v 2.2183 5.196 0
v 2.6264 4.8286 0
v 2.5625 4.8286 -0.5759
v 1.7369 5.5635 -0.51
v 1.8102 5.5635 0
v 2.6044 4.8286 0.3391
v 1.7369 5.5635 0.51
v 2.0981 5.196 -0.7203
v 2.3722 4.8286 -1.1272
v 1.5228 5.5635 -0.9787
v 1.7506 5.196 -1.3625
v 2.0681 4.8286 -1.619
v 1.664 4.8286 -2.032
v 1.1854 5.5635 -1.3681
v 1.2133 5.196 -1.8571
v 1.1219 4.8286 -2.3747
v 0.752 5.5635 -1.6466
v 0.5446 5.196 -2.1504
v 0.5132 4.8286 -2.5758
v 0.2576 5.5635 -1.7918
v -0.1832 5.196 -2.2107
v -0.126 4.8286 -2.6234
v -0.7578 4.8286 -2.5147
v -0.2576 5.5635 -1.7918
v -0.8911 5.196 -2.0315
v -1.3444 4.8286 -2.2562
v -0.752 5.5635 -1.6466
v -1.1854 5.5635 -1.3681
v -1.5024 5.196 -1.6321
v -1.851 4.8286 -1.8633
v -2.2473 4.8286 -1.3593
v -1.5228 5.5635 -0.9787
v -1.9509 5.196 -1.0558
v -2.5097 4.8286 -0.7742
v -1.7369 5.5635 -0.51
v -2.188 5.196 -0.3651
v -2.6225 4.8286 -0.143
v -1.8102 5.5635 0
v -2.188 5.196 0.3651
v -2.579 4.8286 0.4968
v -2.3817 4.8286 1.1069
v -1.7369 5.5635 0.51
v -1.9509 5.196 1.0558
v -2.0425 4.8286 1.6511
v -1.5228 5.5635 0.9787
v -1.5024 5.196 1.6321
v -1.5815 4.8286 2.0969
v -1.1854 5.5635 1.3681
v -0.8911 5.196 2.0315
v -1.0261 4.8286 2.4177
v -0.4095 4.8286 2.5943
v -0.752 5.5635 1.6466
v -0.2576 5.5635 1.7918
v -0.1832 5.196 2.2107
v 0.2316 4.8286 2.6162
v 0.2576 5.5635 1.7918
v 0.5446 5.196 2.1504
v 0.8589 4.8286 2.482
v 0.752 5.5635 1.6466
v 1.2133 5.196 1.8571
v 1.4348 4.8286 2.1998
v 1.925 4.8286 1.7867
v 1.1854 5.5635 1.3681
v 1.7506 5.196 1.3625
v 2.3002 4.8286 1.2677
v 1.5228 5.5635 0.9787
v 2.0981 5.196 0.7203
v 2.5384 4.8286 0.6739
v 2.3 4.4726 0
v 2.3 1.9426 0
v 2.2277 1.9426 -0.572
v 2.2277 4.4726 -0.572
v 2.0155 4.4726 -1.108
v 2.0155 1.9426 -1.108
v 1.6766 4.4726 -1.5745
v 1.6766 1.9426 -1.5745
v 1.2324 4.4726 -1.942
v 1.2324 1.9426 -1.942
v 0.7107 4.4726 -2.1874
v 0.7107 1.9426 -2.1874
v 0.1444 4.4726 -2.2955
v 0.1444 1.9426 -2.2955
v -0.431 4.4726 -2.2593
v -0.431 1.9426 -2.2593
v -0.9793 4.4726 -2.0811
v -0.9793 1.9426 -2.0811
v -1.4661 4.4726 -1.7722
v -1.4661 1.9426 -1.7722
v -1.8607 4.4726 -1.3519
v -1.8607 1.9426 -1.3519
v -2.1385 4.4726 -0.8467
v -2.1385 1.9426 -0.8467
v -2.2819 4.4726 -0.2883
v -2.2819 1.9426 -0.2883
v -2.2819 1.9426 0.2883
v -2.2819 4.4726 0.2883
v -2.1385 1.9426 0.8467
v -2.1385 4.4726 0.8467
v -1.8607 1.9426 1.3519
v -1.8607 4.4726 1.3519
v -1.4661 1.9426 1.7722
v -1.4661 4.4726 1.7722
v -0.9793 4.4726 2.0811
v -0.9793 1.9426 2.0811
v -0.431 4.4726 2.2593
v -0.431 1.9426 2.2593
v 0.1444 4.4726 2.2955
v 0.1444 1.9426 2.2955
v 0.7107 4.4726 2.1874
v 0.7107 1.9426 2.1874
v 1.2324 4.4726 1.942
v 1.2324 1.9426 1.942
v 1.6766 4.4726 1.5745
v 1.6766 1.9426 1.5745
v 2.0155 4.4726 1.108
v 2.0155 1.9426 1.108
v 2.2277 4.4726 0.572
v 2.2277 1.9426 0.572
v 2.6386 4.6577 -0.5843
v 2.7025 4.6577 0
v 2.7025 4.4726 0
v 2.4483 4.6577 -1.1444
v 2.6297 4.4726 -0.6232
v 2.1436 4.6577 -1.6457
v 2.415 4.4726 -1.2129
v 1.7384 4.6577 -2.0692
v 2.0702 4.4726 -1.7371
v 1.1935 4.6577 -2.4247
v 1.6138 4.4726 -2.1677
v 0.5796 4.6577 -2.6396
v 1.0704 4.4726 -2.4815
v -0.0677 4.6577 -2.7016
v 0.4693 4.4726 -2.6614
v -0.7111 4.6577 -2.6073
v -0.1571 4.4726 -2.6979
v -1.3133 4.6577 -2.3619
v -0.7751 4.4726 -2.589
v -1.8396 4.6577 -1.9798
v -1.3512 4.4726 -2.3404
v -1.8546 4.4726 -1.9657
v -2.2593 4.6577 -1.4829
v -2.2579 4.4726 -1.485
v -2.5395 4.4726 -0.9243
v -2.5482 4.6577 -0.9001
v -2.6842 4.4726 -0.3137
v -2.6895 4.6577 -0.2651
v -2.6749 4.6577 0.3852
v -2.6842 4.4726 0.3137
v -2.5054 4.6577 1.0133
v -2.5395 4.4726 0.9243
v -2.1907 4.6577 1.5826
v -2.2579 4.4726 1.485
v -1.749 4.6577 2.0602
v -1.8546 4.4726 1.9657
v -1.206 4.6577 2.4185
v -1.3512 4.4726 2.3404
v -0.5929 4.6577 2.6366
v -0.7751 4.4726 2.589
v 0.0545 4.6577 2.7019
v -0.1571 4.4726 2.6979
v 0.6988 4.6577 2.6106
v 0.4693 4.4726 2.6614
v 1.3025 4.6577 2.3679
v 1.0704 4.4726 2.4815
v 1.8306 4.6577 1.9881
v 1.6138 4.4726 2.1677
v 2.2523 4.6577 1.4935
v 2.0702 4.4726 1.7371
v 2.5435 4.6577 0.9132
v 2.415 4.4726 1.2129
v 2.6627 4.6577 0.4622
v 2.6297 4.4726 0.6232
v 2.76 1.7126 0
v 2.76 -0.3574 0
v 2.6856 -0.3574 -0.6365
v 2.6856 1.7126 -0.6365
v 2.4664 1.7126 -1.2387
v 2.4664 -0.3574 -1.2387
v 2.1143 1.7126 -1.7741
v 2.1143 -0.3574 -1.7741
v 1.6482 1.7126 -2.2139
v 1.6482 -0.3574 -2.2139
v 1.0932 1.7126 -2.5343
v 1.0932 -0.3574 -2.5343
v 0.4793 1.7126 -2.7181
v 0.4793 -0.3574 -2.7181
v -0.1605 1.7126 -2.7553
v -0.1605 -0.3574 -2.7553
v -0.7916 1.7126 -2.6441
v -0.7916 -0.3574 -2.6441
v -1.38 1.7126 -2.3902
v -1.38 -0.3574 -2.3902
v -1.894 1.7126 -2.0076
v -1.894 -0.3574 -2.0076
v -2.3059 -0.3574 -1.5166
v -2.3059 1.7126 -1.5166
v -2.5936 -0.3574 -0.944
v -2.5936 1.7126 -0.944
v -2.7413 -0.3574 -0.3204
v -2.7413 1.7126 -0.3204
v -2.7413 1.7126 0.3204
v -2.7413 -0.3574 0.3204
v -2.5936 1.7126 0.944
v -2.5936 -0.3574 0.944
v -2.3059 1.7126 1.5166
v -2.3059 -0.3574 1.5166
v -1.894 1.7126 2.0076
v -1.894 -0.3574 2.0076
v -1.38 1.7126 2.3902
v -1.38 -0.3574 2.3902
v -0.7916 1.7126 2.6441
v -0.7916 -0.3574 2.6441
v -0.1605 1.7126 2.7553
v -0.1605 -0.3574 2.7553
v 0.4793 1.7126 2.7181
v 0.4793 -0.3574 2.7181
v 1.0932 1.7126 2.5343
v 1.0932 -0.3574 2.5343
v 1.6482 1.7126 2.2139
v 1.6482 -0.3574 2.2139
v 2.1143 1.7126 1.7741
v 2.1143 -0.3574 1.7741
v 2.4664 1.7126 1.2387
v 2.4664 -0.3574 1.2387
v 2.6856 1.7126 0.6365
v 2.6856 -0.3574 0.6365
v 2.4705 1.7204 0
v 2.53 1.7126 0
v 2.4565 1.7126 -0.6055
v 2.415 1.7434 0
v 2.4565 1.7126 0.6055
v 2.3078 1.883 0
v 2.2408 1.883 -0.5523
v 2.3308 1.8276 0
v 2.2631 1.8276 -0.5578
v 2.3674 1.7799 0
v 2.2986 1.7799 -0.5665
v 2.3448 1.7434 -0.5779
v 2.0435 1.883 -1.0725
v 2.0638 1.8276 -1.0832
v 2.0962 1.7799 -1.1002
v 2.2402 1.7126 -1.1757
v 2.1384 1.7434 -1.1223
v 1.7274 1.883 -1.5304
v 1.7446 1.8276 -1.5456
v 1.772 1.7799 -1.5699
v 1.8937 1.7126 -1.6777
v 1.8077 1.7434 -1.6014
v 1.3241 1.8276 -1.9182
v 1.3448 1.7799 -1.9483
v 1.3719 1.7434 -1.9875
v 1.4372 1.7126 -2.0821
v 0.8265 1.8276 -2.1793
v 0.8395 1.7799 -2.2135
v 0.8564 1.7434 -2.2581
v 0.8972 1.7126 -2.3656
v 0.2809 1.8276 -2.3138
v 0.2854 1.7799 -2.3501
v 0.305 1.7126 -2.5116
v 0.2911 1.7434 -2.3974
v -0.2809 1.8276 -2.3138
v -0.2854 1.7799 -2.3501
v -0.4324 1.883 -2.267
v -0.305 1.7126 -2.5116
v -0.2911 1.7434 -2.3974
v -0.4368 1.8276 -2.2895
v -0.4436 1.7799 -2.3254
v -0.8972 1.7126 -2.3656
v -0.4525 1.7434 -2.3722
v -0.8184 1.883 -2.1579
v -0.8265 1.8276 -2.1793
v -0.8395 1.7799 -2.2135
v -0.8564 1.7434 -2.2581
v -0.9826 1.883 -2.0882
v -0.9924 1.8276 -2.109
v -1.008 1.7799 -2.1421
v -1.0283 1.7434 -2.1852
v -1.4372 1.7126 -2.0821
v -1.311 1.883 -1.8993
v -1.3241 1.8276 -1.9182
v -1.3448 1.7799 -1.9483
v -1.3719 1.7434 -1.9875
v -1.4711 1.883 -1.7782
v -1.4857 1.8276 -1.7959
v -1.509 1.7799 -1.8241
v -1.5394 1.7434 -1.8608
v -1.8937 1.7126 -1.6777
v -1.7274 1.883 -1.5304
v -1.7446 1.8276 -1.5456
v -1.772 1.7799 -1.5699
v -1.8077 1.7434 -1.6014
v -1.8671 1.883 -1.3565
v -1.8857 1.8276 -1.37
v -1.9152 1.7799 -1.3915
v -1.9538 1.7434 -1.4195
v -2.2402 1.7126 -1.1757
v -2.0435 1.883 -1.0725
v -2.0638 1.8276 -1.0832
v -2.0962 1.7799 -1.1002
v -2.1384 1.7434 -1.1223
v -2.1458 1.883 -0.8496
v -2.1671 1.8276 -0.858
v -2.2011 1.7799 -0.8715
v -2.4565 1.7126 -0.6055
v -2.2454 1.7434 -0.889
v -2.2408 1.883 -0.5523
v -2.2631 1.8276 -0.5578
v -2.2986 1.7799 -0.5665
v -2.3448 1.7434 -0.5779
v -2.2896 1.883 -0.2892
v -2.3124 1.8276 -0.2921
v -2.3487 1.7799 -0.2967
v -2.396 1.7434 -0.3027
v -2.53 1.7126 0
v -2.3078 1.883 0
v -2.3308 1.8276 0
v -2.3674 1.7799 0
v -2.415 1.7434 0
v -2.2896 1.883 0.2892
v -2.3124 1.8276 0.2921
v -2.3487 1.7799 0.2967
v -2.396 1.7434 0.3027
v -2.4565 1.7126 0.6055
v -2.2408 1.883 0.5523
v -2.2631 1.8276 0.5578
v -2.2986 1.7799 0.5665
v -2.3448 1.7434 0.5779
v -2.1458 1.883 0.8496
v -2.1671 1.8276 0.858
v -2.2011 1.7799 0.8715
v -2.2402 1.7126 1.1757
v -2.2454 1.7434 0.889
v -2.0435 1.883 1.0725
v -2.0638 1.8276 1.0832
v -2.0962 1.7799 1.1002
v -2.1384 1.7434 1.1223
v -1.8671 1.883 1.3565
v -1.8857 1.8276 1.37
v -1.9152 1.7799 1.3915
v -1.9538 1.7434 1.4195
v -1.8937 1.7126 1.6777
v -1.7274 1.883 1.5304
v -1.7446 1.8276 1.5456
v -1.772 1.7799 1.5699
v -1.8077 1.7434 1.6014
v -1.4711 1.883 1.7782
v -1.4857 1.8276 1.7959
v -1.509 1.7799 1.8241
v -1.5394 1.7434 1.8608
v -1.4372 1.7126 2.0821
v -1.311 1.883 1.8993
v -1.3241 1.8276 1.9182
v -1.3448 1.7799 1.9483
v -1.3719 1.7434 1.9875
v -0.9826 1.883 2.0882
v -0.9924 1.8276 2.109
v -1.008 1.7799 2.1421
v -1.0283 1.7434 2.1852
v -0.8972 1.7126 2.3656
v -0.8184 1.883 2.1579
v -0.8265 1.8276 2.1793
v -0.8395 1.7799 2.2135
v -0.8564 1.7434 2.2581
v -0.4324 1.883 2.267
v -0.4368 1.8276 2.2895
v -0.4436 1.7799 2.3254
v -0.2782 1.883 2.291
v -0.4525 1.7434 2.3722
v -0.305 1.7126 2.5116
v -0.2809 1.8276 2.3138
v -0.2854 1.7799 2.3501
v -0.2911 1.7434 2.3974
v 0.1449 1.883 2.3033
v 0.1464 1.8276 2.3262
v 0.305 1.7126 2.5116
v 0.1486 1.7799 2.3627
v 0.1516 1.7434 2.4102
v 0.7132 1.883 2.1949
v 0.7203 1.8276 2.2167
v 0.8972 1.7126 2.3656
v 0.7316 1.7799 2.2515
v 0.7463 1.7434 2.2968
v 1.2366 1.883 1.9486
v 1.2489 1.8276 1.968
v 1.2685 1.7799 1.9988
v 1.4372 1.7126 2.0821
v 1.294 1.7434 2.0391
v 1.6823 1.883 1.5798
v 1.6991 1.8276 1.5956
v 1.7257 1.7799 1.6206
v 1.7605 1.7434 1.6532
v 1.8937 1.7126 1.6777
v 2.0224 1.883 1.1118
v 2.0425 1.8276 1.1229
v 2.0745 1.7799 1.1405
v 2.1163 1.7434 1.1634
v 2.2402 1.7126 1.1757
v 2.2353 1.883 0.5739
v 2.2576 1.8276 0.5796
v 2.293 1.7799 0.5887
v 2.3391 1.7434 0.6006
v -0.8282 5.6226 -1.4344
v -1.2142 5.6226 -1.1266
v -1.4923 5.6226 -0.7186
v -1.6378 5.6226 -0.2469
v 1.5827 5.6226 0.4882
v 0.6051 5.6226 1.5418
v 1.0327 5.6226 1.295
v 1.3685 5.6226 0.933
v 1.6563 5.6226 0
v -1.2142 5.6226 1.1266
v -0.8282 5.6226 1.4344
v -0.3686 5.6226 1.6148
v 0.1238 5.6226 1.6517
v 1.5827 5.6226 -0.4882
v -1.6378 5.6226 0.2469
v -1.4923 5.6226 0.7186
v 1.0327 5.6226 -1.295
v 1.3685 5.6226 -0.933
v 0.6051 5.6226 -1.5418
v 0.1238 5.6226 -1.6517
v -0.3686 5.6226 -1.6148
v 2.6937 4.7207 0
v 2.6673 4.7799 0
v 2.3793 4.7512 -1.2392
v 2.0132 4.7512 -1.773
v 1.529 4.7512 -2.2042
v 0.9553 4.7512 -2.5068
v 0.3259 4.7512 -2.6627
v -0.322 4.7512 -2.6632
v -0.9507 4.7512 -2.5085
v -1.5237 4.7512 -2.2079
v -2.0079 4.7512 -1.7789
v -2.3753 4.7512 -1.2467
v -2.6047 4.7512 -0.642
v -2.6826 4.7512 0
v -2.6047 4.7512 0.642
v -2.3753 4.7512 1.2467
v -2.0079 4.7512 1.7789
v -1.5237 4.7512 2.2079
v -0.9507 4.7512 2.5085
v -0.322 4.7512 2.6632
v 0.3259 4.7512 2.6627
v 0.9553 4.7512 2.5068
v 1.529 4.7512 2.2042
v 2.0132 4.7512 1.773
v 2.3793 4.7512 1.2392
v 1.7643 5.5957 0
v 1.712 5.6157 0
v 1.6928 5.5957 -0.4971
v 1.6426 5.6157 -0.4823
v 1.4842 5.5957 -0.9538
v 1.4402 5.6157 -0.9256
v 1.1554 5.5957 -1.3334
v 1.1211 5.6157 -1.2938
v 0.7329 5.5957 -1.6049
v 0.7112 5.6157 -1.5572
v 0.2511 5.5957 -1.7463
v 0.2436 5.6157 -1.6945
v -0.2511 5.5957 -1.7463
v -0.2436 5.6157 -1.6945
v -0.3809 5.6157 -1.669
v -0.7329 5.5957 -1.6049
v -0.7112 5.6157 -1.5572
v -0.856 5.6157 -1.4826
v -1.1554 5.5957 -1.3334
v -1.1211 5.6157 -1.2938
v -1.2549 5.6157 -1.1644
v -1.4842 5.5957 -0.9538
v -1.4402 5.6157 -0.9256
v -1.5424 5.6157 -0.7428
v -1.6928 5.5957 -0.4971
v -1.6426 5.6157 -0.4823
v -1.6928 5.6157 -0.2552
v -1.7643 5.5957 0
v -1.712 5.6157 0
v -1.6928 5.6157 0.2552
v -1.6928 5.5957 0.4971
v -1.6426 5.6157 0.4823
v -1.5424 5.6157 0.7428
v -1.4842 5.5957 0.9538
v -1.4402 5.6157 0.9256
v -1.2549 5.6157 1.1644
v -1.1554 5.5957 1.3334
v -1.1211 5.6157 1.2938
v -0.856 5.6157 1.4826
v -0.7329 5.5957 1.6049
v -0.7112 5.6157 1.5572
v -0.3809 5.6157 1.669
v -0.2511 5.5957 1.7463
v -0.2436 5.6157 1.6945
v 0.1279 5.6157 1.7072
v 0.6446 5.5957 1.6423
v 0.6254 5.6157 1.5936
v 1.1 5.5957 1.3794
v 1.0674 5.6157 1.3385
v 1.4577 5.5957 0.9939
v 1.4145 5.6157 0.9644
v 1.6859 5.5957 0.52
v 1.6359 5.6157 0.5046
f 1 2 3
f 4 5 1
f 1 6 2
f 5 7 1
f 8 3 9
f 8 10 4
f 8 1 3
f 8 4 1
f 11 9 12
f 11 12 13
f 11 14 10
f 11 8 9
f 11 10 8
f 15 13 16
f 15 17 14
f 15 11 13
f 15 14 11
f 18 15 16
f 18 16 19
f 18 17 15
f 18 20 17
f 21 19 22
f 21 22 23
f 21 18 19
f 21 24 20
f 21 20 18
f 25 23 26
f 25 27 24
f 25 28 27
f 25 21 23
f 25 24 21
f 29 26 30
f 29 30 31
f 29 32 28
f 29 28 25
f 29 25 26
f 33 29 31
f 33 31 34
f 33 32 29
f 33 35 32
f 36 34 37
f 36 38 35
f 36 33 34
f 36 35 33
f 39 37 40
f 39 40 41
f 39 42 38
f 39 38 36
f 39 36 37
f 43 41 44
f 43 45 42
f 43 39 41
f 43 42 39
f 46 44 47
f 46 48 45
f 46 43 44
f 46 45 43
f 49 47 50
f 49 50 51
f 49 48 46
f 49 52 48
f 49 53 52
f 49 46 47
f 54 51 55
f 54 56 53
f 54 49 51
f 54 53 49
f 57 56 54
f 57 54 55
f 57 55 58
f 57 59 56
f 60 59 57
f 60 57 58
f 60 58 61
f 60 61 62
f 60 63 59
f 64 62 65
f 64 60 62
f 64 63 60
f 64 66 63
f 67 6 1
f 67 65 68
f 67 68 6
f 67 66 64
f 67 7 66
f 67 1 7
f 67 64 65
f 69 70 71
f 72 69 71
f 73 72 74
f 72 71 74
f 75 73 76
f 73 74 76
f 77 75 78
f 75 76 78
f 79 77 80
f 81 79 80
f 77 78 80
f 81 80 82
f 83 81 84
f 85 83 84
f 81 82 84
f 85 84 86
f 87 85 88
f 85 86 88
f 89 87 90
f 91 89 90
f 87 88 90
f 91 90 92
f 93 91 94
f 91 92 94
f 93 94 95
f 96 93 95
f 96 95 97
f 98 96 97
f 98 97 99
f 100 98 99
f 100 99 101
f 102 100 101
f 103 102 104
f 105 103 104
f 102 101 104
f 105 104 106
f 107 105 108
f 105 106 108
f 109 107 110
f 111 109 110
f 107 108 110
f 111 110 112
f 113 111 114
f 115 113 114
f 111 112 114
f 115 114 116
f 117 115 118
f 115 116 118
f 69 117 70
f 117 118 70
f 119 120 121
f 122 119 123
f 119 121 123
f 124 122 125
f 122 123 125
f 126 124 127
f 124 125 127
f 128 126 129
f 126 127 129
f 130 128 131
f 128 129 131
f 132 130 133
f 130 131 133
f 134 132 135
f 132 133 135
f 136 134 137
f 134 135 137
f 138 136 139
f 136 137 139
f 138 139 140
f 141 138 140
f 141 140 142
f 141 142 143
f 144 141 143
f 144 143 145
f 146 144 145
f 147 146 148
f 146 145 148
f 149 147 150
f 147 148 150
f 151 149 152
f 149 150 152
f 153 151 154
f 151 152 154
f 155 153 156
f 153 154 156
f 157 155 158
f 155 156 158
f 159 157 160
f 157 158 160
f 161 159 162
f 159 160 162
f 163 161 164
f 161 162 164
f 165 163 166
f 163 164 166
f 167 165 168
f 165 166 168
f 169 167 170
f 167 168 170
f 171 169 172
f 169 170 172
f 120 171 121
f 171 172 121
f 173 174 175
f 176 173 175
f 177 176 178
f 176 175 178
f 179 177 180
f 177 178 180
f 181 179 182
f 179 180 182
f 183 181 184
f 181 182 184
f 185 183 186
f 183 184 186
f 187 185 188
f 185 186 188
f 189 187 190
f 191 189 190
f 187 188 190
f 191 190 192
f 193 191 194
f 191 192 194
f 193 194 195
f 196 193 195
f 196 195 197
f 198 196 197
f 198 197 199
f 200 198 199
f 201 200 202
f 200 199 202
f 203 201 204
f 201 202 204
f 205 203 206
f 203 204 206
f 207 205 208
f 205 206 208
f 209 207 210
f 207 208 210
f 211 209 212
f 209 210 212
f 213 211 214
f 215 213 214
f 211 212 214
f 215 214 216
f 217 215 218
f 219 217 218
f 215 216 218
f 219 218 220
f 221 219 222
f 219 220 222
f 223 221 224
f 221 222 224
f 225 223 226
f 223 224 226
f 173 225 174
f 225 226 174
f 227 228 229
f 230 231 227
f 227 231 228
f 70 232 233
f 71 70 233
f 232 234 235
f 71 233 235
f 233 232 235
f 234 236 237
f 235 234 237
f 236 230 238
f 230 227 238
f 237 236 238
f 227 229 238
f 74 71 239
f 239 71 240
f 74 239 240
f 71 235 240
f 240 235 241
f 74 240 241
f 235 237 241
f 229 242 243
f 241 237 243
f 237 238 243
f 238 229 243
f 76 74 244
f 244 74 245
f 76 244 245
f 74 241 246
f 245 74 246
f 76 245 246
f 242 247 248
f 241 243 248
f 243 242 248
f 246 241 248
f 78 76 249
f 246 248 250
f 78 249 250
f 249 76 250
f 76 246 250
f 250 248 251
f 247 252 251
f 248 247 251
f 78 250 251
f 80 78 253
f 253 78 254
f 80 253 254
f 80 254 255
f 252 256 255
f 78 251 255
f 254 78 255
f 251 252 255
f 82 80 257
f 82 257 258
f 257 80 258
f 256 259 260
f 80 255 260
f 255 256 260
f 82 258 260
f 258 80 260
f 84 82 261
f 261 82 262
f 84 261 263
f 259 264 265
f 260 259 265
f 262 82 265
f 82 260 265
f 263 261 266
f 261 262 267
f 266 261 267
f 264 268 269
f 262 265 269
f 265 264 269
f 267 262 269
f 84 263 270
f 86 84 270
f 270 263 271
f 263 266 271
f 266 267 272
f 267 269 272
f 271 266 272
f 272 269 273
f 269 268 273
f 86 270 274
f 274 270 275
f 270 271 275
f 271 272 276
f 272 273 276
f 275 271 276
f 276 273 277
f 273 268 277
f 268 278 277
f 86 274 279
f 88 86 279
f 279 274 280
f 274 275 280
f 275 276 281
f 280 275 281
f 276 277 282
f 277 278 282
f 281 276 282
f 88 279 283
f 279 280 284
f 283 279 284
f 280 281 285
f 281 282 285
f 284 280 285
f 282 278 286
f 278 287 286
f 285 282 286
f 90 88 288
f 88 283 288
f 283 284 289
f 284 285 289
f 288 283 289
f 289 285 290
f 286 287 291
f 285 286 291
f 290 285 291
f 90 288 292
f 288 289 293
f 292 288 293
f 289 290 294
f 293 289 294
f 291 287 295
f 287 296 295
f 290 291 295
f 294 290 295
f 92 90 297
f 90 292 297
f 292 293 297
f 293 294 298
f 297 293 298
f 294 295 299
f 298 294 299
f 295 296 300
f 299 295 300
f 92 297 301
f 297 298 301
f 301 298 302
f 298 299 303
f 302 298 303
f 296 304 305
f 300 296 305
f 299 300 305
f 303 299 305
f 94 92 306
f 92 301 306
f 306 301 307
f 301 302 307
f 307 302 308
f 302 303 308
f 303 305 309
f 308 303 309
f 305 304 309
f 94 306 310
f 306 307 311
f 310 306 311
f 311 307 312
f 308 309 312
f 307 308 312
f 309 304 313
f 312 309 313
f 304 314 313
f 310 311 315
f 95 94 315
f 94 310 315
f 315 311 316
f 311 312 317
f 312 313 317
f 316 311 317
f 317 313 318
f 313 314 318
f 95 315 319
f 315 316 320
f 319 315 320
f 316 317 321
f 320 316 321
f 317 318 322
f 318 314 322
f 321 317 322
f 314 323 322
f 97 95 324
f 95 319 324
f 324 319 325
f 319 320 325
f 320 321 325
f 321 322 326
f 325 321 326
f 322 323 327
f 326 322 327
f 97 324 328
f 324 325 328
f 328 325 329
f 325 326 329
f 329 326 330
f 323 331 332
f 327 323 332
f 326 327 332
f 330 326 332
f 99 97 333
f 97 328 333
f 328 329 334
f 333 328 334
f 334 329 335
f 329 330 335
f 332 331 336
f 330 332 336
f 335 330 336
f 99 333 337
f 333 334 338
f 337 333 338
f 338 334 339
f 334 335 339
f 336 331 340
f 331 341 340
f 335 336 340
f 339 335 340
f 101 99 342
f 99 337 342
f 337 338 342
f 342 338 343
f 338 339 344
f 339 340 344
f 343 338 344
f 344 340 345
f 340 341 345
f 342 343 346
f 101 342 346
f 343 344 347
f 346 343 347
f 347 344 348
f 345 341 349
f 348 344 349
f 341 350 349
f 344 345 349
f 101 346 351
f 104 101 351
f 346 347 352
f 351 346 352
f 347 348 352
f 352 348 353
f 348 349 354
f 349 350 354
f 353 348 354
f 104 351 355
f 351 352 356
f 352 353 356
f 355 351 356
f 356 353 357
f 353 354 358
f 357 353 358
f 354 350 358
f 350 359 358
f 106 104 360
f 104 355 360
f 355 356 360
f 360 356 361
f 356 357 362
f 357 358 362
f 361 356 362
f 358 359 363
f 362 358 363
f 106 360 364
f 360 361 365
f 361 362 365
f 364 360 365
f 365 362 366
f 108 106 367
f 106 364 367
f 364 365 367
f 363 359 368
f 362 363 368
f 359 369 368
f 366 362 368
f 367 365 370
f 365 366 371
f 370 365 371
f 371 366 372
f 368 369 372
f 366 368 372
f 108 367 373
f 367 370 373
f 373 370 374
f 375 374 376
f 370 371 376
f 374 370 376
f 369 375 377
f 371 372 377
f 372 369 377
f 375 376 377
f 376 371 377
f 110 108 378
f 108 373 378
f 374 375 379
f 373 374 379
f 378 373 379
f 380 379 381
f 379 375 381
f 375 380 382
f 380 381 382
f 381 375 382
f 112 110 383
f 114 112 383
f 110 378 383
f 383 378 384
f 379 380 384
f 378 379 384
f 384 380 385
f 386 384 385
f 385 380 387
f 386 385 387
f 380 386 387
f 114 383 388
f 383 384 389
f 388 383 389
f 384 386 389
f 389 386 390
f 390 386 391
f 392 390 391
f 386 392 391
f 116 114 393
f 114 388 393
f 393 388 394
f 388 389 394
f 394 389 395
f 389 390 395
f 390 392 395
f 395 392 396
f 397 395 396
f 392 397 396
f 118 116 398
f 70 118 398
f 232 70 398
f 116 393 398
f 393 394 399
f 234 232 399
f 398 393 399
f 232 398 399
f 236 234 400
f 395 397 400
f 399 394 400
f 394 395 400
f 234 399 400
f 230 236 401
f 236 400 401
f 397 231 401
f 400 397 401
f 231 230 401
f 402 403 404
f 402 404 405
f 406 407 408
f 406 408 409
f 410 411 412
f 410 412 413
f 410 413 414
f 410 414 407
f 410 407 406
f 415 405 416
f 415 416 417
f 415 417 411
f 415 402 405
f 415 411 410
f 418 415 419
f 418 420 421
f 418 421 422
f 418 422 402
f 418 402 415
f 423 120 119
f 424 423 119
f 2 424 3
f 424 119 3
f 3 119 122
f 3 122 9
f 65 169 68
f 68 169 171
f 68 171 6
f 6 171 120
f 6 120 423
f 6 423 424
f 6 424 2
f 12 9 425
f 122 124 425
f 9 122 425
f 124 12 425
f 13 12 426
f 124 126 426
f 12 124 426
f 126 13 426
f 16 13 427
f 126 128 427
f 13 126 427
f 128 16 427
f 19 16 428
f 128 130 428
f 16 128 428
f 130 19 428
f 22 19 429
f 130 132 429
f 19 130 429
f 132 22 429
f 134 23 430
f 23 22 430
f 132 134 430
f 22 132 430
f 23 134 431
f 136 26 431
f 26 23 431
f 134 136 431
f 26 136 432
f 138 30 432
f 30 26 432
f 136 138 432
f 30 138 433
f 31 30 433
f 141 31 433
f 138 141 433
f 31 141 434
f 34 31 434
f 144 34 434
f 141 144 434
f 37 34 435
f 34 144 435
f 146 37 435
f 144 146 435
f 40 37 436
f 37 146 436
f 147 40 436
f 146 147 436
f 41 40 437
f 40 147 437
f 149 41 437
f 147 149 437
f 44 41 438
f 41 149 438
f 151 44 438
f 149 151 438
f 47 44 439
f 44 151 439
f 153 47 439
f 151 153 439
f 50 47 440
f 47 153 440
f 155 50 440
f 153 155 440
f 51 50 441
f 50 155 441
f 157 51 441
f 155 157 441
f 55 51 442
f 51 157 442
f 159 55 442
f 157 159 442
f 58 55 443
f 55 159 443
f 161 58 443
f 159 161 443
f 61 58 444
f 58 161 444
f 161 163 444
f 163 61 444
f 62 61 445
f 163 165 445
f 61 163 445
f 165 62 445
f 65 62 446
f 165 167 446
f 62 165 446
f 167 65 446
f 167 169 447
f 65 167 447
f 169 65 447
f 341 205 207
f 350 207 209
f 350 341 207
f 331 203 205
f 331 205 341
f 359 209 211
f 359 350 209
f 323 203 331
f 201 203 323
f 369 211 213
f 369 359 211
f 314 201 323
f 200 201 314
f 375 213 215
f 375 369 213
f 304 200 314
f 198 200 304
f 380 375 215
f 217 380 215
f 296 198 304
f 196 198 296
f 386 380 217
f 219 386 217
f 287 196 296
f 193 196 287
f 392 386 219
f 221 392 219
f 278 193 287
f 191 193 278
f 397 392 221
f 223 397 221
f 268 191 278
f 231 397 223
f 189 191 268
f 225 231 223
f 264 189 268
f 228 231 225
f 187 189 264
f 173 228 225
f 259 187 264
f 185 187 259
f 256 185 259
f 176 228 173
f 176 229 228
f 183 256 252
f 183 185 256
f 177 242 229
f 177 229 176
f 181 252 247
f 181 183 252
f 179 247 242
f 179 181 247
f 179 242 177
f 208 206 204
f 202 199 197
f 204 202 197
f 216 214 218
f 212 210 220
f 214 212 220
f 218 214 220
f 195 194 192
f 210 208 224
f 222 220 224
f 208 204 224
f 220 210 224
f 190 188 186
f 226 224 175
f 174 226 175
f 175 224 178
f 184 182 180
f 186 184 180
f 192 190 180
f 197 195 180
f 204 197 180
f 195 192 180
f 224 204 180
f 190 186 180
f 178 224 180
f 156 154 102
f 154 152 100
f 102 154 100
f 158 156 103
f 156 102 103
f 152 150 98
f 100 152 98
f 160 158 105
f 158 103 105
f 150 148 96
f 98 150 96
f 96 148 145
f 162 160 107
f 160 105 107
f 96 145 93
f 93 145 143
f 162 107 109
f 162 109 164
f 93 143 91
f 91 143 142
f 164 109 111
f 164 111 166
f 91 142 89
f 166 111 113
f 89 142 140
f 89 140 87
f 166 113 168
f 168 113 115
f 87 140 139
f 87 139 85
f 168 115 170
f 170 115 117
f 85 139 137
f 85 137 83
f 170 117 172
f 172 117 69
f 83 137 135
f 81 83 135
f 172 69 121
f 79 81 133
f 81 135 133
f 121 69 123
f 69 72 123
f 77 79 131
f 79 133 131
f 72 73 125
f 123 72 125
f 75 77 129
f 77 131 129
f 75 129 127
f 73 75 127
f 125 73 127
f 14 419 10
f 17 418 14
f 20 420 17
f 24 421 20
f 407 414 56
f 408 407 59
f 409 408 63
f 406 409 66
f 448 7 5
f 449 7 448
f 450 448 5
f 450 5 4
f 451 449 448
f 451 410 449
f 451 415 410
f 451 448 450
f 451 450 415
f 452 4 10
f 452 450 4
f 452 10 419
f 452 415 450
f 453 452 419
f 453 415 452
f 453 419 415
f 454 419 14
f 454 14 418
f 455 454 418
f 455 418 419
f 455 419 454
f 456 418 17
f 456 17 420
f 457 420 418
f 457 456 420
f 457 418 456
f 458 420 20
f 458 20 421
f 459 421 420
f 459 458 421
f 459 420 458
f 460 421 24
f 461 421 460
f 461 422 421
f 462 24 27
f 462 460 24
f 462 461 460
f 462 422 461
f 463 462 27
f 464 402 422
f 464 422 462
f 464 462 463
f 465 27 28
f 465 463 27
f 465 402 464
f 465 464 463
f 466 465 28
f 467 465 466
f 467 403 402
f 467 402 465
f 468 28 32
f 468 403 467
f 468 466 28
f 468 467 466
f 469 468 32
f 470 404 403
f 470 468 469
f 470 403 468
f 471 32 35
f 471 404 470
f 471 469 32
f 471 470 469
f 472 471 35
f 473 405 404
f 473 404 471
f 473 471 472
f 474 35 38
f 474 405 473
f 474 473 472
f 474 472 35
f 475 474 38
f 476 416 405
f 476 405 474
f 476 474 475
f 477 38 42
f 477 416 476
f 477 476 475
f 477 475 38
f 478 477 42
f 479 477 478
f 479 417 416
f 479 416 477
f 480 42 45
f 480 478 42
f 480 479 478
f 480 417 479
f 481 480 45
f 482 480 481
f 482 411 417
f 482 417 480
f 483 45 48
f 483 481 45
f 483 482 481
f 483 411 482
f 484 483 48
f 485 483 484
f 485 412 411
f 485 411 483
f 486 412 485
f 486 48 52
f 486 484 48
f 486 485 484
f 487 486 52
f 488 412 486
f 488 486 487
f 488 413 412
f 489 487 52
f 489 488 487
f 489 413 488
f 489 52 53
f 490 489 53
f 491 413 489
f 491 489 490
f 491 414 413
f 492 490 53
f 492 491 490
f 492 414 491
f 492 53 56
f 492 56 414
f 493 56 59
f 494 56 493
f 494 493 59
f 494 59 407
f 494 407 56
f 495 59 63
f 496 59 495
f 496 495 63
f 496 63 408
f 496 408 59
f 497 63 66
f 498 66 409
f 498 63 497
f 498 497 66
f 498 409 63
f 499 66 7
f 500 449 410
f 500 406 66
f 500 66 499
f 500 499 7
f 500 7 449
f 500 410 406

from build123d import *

# Parameters (mm, degrees)
SKETCH1_R           = 2.4
BOSS_EXTRUDE1_DEPTH = 1.8
SKETCH2_R           = 2
BOSS_EXTRUDE2_DEPTH = 2.4
SKETCH3_R           = 2.35
BOSS_EXTRUDE3_DEPTH = 1
CHAMFER1_SIZE       = 0.75
CHAMFER1_SIZE2      = 0.832959386
FILLET1_R           = 0.2
SCALE1_SCALE        = 1.15


with BuildPart() as part:
    # Sketch1 → Boss-Extrude1 (new body)
    with BuildSketch(Plane(origin=(0, 0, 0), x_dir=(1, 0, 0), z_dir=(0, 1, 0))):
        Circle(SKETCH1_R)
    extrude(amount=BOSS_EXTRUDE1_DEPTH)

    # Sketch2 → Boss-Extrude2 (add)
    with BuildSketch(Plane(origin=(0, 1.8, 0), x_dir=(1, 0, 0), z_dir=(0, 1, 0))):
        Circle(SKETCH2_R)
    extrude(amount=BOSS_EXTRUDE2_DEPTH)

    # Sketch3 → Boss-Extrude3 (add)
    with BuildSketch(Plane(origin=(0, 4.2, 0), x_dir=(1, 0, 0), z_dir=(0, 1, 0))):
        Circle(SKETCH3_R)
    extrude(amount=BOSS_EXTRUDE3_DEPTH)

    # Chamfer1
    chamfer1_edges = [part.edges().sort_by_distance(p)[0] for p in [
        (-2.35, 5.2, 0),
    ]]
    chamfer1_side = [part.faces().sort_by_distance(p)[0] for p in [
        (-2.35, 4.7, 0),
    ]]
    chamfer(chamfer1_edges, length=CHAMFER1_SIZE, length2=CHAMFER1_SIZE2, reference=chamfer1_side[0])

    # Fillet1
    fillet1_edges = [part.edges().sort_by_distance(p)[0] for p in [
        (-1.517040614, 5.2, 0),
        (-2.35, 4.45, 0),
        (-2, 1.8, 0),
    ]]
    fillet(fillet1_edges, radius=FILLET1_R)


with BuildPart() as part_1:
    # Scale1: scaled about (-4.5e-08, 2.382820286, 0)
    add(part.part.scale(SCALE1_SCALE).moved(Location((7e-09, -0.357423043, 0))))


solid = part_1.part
